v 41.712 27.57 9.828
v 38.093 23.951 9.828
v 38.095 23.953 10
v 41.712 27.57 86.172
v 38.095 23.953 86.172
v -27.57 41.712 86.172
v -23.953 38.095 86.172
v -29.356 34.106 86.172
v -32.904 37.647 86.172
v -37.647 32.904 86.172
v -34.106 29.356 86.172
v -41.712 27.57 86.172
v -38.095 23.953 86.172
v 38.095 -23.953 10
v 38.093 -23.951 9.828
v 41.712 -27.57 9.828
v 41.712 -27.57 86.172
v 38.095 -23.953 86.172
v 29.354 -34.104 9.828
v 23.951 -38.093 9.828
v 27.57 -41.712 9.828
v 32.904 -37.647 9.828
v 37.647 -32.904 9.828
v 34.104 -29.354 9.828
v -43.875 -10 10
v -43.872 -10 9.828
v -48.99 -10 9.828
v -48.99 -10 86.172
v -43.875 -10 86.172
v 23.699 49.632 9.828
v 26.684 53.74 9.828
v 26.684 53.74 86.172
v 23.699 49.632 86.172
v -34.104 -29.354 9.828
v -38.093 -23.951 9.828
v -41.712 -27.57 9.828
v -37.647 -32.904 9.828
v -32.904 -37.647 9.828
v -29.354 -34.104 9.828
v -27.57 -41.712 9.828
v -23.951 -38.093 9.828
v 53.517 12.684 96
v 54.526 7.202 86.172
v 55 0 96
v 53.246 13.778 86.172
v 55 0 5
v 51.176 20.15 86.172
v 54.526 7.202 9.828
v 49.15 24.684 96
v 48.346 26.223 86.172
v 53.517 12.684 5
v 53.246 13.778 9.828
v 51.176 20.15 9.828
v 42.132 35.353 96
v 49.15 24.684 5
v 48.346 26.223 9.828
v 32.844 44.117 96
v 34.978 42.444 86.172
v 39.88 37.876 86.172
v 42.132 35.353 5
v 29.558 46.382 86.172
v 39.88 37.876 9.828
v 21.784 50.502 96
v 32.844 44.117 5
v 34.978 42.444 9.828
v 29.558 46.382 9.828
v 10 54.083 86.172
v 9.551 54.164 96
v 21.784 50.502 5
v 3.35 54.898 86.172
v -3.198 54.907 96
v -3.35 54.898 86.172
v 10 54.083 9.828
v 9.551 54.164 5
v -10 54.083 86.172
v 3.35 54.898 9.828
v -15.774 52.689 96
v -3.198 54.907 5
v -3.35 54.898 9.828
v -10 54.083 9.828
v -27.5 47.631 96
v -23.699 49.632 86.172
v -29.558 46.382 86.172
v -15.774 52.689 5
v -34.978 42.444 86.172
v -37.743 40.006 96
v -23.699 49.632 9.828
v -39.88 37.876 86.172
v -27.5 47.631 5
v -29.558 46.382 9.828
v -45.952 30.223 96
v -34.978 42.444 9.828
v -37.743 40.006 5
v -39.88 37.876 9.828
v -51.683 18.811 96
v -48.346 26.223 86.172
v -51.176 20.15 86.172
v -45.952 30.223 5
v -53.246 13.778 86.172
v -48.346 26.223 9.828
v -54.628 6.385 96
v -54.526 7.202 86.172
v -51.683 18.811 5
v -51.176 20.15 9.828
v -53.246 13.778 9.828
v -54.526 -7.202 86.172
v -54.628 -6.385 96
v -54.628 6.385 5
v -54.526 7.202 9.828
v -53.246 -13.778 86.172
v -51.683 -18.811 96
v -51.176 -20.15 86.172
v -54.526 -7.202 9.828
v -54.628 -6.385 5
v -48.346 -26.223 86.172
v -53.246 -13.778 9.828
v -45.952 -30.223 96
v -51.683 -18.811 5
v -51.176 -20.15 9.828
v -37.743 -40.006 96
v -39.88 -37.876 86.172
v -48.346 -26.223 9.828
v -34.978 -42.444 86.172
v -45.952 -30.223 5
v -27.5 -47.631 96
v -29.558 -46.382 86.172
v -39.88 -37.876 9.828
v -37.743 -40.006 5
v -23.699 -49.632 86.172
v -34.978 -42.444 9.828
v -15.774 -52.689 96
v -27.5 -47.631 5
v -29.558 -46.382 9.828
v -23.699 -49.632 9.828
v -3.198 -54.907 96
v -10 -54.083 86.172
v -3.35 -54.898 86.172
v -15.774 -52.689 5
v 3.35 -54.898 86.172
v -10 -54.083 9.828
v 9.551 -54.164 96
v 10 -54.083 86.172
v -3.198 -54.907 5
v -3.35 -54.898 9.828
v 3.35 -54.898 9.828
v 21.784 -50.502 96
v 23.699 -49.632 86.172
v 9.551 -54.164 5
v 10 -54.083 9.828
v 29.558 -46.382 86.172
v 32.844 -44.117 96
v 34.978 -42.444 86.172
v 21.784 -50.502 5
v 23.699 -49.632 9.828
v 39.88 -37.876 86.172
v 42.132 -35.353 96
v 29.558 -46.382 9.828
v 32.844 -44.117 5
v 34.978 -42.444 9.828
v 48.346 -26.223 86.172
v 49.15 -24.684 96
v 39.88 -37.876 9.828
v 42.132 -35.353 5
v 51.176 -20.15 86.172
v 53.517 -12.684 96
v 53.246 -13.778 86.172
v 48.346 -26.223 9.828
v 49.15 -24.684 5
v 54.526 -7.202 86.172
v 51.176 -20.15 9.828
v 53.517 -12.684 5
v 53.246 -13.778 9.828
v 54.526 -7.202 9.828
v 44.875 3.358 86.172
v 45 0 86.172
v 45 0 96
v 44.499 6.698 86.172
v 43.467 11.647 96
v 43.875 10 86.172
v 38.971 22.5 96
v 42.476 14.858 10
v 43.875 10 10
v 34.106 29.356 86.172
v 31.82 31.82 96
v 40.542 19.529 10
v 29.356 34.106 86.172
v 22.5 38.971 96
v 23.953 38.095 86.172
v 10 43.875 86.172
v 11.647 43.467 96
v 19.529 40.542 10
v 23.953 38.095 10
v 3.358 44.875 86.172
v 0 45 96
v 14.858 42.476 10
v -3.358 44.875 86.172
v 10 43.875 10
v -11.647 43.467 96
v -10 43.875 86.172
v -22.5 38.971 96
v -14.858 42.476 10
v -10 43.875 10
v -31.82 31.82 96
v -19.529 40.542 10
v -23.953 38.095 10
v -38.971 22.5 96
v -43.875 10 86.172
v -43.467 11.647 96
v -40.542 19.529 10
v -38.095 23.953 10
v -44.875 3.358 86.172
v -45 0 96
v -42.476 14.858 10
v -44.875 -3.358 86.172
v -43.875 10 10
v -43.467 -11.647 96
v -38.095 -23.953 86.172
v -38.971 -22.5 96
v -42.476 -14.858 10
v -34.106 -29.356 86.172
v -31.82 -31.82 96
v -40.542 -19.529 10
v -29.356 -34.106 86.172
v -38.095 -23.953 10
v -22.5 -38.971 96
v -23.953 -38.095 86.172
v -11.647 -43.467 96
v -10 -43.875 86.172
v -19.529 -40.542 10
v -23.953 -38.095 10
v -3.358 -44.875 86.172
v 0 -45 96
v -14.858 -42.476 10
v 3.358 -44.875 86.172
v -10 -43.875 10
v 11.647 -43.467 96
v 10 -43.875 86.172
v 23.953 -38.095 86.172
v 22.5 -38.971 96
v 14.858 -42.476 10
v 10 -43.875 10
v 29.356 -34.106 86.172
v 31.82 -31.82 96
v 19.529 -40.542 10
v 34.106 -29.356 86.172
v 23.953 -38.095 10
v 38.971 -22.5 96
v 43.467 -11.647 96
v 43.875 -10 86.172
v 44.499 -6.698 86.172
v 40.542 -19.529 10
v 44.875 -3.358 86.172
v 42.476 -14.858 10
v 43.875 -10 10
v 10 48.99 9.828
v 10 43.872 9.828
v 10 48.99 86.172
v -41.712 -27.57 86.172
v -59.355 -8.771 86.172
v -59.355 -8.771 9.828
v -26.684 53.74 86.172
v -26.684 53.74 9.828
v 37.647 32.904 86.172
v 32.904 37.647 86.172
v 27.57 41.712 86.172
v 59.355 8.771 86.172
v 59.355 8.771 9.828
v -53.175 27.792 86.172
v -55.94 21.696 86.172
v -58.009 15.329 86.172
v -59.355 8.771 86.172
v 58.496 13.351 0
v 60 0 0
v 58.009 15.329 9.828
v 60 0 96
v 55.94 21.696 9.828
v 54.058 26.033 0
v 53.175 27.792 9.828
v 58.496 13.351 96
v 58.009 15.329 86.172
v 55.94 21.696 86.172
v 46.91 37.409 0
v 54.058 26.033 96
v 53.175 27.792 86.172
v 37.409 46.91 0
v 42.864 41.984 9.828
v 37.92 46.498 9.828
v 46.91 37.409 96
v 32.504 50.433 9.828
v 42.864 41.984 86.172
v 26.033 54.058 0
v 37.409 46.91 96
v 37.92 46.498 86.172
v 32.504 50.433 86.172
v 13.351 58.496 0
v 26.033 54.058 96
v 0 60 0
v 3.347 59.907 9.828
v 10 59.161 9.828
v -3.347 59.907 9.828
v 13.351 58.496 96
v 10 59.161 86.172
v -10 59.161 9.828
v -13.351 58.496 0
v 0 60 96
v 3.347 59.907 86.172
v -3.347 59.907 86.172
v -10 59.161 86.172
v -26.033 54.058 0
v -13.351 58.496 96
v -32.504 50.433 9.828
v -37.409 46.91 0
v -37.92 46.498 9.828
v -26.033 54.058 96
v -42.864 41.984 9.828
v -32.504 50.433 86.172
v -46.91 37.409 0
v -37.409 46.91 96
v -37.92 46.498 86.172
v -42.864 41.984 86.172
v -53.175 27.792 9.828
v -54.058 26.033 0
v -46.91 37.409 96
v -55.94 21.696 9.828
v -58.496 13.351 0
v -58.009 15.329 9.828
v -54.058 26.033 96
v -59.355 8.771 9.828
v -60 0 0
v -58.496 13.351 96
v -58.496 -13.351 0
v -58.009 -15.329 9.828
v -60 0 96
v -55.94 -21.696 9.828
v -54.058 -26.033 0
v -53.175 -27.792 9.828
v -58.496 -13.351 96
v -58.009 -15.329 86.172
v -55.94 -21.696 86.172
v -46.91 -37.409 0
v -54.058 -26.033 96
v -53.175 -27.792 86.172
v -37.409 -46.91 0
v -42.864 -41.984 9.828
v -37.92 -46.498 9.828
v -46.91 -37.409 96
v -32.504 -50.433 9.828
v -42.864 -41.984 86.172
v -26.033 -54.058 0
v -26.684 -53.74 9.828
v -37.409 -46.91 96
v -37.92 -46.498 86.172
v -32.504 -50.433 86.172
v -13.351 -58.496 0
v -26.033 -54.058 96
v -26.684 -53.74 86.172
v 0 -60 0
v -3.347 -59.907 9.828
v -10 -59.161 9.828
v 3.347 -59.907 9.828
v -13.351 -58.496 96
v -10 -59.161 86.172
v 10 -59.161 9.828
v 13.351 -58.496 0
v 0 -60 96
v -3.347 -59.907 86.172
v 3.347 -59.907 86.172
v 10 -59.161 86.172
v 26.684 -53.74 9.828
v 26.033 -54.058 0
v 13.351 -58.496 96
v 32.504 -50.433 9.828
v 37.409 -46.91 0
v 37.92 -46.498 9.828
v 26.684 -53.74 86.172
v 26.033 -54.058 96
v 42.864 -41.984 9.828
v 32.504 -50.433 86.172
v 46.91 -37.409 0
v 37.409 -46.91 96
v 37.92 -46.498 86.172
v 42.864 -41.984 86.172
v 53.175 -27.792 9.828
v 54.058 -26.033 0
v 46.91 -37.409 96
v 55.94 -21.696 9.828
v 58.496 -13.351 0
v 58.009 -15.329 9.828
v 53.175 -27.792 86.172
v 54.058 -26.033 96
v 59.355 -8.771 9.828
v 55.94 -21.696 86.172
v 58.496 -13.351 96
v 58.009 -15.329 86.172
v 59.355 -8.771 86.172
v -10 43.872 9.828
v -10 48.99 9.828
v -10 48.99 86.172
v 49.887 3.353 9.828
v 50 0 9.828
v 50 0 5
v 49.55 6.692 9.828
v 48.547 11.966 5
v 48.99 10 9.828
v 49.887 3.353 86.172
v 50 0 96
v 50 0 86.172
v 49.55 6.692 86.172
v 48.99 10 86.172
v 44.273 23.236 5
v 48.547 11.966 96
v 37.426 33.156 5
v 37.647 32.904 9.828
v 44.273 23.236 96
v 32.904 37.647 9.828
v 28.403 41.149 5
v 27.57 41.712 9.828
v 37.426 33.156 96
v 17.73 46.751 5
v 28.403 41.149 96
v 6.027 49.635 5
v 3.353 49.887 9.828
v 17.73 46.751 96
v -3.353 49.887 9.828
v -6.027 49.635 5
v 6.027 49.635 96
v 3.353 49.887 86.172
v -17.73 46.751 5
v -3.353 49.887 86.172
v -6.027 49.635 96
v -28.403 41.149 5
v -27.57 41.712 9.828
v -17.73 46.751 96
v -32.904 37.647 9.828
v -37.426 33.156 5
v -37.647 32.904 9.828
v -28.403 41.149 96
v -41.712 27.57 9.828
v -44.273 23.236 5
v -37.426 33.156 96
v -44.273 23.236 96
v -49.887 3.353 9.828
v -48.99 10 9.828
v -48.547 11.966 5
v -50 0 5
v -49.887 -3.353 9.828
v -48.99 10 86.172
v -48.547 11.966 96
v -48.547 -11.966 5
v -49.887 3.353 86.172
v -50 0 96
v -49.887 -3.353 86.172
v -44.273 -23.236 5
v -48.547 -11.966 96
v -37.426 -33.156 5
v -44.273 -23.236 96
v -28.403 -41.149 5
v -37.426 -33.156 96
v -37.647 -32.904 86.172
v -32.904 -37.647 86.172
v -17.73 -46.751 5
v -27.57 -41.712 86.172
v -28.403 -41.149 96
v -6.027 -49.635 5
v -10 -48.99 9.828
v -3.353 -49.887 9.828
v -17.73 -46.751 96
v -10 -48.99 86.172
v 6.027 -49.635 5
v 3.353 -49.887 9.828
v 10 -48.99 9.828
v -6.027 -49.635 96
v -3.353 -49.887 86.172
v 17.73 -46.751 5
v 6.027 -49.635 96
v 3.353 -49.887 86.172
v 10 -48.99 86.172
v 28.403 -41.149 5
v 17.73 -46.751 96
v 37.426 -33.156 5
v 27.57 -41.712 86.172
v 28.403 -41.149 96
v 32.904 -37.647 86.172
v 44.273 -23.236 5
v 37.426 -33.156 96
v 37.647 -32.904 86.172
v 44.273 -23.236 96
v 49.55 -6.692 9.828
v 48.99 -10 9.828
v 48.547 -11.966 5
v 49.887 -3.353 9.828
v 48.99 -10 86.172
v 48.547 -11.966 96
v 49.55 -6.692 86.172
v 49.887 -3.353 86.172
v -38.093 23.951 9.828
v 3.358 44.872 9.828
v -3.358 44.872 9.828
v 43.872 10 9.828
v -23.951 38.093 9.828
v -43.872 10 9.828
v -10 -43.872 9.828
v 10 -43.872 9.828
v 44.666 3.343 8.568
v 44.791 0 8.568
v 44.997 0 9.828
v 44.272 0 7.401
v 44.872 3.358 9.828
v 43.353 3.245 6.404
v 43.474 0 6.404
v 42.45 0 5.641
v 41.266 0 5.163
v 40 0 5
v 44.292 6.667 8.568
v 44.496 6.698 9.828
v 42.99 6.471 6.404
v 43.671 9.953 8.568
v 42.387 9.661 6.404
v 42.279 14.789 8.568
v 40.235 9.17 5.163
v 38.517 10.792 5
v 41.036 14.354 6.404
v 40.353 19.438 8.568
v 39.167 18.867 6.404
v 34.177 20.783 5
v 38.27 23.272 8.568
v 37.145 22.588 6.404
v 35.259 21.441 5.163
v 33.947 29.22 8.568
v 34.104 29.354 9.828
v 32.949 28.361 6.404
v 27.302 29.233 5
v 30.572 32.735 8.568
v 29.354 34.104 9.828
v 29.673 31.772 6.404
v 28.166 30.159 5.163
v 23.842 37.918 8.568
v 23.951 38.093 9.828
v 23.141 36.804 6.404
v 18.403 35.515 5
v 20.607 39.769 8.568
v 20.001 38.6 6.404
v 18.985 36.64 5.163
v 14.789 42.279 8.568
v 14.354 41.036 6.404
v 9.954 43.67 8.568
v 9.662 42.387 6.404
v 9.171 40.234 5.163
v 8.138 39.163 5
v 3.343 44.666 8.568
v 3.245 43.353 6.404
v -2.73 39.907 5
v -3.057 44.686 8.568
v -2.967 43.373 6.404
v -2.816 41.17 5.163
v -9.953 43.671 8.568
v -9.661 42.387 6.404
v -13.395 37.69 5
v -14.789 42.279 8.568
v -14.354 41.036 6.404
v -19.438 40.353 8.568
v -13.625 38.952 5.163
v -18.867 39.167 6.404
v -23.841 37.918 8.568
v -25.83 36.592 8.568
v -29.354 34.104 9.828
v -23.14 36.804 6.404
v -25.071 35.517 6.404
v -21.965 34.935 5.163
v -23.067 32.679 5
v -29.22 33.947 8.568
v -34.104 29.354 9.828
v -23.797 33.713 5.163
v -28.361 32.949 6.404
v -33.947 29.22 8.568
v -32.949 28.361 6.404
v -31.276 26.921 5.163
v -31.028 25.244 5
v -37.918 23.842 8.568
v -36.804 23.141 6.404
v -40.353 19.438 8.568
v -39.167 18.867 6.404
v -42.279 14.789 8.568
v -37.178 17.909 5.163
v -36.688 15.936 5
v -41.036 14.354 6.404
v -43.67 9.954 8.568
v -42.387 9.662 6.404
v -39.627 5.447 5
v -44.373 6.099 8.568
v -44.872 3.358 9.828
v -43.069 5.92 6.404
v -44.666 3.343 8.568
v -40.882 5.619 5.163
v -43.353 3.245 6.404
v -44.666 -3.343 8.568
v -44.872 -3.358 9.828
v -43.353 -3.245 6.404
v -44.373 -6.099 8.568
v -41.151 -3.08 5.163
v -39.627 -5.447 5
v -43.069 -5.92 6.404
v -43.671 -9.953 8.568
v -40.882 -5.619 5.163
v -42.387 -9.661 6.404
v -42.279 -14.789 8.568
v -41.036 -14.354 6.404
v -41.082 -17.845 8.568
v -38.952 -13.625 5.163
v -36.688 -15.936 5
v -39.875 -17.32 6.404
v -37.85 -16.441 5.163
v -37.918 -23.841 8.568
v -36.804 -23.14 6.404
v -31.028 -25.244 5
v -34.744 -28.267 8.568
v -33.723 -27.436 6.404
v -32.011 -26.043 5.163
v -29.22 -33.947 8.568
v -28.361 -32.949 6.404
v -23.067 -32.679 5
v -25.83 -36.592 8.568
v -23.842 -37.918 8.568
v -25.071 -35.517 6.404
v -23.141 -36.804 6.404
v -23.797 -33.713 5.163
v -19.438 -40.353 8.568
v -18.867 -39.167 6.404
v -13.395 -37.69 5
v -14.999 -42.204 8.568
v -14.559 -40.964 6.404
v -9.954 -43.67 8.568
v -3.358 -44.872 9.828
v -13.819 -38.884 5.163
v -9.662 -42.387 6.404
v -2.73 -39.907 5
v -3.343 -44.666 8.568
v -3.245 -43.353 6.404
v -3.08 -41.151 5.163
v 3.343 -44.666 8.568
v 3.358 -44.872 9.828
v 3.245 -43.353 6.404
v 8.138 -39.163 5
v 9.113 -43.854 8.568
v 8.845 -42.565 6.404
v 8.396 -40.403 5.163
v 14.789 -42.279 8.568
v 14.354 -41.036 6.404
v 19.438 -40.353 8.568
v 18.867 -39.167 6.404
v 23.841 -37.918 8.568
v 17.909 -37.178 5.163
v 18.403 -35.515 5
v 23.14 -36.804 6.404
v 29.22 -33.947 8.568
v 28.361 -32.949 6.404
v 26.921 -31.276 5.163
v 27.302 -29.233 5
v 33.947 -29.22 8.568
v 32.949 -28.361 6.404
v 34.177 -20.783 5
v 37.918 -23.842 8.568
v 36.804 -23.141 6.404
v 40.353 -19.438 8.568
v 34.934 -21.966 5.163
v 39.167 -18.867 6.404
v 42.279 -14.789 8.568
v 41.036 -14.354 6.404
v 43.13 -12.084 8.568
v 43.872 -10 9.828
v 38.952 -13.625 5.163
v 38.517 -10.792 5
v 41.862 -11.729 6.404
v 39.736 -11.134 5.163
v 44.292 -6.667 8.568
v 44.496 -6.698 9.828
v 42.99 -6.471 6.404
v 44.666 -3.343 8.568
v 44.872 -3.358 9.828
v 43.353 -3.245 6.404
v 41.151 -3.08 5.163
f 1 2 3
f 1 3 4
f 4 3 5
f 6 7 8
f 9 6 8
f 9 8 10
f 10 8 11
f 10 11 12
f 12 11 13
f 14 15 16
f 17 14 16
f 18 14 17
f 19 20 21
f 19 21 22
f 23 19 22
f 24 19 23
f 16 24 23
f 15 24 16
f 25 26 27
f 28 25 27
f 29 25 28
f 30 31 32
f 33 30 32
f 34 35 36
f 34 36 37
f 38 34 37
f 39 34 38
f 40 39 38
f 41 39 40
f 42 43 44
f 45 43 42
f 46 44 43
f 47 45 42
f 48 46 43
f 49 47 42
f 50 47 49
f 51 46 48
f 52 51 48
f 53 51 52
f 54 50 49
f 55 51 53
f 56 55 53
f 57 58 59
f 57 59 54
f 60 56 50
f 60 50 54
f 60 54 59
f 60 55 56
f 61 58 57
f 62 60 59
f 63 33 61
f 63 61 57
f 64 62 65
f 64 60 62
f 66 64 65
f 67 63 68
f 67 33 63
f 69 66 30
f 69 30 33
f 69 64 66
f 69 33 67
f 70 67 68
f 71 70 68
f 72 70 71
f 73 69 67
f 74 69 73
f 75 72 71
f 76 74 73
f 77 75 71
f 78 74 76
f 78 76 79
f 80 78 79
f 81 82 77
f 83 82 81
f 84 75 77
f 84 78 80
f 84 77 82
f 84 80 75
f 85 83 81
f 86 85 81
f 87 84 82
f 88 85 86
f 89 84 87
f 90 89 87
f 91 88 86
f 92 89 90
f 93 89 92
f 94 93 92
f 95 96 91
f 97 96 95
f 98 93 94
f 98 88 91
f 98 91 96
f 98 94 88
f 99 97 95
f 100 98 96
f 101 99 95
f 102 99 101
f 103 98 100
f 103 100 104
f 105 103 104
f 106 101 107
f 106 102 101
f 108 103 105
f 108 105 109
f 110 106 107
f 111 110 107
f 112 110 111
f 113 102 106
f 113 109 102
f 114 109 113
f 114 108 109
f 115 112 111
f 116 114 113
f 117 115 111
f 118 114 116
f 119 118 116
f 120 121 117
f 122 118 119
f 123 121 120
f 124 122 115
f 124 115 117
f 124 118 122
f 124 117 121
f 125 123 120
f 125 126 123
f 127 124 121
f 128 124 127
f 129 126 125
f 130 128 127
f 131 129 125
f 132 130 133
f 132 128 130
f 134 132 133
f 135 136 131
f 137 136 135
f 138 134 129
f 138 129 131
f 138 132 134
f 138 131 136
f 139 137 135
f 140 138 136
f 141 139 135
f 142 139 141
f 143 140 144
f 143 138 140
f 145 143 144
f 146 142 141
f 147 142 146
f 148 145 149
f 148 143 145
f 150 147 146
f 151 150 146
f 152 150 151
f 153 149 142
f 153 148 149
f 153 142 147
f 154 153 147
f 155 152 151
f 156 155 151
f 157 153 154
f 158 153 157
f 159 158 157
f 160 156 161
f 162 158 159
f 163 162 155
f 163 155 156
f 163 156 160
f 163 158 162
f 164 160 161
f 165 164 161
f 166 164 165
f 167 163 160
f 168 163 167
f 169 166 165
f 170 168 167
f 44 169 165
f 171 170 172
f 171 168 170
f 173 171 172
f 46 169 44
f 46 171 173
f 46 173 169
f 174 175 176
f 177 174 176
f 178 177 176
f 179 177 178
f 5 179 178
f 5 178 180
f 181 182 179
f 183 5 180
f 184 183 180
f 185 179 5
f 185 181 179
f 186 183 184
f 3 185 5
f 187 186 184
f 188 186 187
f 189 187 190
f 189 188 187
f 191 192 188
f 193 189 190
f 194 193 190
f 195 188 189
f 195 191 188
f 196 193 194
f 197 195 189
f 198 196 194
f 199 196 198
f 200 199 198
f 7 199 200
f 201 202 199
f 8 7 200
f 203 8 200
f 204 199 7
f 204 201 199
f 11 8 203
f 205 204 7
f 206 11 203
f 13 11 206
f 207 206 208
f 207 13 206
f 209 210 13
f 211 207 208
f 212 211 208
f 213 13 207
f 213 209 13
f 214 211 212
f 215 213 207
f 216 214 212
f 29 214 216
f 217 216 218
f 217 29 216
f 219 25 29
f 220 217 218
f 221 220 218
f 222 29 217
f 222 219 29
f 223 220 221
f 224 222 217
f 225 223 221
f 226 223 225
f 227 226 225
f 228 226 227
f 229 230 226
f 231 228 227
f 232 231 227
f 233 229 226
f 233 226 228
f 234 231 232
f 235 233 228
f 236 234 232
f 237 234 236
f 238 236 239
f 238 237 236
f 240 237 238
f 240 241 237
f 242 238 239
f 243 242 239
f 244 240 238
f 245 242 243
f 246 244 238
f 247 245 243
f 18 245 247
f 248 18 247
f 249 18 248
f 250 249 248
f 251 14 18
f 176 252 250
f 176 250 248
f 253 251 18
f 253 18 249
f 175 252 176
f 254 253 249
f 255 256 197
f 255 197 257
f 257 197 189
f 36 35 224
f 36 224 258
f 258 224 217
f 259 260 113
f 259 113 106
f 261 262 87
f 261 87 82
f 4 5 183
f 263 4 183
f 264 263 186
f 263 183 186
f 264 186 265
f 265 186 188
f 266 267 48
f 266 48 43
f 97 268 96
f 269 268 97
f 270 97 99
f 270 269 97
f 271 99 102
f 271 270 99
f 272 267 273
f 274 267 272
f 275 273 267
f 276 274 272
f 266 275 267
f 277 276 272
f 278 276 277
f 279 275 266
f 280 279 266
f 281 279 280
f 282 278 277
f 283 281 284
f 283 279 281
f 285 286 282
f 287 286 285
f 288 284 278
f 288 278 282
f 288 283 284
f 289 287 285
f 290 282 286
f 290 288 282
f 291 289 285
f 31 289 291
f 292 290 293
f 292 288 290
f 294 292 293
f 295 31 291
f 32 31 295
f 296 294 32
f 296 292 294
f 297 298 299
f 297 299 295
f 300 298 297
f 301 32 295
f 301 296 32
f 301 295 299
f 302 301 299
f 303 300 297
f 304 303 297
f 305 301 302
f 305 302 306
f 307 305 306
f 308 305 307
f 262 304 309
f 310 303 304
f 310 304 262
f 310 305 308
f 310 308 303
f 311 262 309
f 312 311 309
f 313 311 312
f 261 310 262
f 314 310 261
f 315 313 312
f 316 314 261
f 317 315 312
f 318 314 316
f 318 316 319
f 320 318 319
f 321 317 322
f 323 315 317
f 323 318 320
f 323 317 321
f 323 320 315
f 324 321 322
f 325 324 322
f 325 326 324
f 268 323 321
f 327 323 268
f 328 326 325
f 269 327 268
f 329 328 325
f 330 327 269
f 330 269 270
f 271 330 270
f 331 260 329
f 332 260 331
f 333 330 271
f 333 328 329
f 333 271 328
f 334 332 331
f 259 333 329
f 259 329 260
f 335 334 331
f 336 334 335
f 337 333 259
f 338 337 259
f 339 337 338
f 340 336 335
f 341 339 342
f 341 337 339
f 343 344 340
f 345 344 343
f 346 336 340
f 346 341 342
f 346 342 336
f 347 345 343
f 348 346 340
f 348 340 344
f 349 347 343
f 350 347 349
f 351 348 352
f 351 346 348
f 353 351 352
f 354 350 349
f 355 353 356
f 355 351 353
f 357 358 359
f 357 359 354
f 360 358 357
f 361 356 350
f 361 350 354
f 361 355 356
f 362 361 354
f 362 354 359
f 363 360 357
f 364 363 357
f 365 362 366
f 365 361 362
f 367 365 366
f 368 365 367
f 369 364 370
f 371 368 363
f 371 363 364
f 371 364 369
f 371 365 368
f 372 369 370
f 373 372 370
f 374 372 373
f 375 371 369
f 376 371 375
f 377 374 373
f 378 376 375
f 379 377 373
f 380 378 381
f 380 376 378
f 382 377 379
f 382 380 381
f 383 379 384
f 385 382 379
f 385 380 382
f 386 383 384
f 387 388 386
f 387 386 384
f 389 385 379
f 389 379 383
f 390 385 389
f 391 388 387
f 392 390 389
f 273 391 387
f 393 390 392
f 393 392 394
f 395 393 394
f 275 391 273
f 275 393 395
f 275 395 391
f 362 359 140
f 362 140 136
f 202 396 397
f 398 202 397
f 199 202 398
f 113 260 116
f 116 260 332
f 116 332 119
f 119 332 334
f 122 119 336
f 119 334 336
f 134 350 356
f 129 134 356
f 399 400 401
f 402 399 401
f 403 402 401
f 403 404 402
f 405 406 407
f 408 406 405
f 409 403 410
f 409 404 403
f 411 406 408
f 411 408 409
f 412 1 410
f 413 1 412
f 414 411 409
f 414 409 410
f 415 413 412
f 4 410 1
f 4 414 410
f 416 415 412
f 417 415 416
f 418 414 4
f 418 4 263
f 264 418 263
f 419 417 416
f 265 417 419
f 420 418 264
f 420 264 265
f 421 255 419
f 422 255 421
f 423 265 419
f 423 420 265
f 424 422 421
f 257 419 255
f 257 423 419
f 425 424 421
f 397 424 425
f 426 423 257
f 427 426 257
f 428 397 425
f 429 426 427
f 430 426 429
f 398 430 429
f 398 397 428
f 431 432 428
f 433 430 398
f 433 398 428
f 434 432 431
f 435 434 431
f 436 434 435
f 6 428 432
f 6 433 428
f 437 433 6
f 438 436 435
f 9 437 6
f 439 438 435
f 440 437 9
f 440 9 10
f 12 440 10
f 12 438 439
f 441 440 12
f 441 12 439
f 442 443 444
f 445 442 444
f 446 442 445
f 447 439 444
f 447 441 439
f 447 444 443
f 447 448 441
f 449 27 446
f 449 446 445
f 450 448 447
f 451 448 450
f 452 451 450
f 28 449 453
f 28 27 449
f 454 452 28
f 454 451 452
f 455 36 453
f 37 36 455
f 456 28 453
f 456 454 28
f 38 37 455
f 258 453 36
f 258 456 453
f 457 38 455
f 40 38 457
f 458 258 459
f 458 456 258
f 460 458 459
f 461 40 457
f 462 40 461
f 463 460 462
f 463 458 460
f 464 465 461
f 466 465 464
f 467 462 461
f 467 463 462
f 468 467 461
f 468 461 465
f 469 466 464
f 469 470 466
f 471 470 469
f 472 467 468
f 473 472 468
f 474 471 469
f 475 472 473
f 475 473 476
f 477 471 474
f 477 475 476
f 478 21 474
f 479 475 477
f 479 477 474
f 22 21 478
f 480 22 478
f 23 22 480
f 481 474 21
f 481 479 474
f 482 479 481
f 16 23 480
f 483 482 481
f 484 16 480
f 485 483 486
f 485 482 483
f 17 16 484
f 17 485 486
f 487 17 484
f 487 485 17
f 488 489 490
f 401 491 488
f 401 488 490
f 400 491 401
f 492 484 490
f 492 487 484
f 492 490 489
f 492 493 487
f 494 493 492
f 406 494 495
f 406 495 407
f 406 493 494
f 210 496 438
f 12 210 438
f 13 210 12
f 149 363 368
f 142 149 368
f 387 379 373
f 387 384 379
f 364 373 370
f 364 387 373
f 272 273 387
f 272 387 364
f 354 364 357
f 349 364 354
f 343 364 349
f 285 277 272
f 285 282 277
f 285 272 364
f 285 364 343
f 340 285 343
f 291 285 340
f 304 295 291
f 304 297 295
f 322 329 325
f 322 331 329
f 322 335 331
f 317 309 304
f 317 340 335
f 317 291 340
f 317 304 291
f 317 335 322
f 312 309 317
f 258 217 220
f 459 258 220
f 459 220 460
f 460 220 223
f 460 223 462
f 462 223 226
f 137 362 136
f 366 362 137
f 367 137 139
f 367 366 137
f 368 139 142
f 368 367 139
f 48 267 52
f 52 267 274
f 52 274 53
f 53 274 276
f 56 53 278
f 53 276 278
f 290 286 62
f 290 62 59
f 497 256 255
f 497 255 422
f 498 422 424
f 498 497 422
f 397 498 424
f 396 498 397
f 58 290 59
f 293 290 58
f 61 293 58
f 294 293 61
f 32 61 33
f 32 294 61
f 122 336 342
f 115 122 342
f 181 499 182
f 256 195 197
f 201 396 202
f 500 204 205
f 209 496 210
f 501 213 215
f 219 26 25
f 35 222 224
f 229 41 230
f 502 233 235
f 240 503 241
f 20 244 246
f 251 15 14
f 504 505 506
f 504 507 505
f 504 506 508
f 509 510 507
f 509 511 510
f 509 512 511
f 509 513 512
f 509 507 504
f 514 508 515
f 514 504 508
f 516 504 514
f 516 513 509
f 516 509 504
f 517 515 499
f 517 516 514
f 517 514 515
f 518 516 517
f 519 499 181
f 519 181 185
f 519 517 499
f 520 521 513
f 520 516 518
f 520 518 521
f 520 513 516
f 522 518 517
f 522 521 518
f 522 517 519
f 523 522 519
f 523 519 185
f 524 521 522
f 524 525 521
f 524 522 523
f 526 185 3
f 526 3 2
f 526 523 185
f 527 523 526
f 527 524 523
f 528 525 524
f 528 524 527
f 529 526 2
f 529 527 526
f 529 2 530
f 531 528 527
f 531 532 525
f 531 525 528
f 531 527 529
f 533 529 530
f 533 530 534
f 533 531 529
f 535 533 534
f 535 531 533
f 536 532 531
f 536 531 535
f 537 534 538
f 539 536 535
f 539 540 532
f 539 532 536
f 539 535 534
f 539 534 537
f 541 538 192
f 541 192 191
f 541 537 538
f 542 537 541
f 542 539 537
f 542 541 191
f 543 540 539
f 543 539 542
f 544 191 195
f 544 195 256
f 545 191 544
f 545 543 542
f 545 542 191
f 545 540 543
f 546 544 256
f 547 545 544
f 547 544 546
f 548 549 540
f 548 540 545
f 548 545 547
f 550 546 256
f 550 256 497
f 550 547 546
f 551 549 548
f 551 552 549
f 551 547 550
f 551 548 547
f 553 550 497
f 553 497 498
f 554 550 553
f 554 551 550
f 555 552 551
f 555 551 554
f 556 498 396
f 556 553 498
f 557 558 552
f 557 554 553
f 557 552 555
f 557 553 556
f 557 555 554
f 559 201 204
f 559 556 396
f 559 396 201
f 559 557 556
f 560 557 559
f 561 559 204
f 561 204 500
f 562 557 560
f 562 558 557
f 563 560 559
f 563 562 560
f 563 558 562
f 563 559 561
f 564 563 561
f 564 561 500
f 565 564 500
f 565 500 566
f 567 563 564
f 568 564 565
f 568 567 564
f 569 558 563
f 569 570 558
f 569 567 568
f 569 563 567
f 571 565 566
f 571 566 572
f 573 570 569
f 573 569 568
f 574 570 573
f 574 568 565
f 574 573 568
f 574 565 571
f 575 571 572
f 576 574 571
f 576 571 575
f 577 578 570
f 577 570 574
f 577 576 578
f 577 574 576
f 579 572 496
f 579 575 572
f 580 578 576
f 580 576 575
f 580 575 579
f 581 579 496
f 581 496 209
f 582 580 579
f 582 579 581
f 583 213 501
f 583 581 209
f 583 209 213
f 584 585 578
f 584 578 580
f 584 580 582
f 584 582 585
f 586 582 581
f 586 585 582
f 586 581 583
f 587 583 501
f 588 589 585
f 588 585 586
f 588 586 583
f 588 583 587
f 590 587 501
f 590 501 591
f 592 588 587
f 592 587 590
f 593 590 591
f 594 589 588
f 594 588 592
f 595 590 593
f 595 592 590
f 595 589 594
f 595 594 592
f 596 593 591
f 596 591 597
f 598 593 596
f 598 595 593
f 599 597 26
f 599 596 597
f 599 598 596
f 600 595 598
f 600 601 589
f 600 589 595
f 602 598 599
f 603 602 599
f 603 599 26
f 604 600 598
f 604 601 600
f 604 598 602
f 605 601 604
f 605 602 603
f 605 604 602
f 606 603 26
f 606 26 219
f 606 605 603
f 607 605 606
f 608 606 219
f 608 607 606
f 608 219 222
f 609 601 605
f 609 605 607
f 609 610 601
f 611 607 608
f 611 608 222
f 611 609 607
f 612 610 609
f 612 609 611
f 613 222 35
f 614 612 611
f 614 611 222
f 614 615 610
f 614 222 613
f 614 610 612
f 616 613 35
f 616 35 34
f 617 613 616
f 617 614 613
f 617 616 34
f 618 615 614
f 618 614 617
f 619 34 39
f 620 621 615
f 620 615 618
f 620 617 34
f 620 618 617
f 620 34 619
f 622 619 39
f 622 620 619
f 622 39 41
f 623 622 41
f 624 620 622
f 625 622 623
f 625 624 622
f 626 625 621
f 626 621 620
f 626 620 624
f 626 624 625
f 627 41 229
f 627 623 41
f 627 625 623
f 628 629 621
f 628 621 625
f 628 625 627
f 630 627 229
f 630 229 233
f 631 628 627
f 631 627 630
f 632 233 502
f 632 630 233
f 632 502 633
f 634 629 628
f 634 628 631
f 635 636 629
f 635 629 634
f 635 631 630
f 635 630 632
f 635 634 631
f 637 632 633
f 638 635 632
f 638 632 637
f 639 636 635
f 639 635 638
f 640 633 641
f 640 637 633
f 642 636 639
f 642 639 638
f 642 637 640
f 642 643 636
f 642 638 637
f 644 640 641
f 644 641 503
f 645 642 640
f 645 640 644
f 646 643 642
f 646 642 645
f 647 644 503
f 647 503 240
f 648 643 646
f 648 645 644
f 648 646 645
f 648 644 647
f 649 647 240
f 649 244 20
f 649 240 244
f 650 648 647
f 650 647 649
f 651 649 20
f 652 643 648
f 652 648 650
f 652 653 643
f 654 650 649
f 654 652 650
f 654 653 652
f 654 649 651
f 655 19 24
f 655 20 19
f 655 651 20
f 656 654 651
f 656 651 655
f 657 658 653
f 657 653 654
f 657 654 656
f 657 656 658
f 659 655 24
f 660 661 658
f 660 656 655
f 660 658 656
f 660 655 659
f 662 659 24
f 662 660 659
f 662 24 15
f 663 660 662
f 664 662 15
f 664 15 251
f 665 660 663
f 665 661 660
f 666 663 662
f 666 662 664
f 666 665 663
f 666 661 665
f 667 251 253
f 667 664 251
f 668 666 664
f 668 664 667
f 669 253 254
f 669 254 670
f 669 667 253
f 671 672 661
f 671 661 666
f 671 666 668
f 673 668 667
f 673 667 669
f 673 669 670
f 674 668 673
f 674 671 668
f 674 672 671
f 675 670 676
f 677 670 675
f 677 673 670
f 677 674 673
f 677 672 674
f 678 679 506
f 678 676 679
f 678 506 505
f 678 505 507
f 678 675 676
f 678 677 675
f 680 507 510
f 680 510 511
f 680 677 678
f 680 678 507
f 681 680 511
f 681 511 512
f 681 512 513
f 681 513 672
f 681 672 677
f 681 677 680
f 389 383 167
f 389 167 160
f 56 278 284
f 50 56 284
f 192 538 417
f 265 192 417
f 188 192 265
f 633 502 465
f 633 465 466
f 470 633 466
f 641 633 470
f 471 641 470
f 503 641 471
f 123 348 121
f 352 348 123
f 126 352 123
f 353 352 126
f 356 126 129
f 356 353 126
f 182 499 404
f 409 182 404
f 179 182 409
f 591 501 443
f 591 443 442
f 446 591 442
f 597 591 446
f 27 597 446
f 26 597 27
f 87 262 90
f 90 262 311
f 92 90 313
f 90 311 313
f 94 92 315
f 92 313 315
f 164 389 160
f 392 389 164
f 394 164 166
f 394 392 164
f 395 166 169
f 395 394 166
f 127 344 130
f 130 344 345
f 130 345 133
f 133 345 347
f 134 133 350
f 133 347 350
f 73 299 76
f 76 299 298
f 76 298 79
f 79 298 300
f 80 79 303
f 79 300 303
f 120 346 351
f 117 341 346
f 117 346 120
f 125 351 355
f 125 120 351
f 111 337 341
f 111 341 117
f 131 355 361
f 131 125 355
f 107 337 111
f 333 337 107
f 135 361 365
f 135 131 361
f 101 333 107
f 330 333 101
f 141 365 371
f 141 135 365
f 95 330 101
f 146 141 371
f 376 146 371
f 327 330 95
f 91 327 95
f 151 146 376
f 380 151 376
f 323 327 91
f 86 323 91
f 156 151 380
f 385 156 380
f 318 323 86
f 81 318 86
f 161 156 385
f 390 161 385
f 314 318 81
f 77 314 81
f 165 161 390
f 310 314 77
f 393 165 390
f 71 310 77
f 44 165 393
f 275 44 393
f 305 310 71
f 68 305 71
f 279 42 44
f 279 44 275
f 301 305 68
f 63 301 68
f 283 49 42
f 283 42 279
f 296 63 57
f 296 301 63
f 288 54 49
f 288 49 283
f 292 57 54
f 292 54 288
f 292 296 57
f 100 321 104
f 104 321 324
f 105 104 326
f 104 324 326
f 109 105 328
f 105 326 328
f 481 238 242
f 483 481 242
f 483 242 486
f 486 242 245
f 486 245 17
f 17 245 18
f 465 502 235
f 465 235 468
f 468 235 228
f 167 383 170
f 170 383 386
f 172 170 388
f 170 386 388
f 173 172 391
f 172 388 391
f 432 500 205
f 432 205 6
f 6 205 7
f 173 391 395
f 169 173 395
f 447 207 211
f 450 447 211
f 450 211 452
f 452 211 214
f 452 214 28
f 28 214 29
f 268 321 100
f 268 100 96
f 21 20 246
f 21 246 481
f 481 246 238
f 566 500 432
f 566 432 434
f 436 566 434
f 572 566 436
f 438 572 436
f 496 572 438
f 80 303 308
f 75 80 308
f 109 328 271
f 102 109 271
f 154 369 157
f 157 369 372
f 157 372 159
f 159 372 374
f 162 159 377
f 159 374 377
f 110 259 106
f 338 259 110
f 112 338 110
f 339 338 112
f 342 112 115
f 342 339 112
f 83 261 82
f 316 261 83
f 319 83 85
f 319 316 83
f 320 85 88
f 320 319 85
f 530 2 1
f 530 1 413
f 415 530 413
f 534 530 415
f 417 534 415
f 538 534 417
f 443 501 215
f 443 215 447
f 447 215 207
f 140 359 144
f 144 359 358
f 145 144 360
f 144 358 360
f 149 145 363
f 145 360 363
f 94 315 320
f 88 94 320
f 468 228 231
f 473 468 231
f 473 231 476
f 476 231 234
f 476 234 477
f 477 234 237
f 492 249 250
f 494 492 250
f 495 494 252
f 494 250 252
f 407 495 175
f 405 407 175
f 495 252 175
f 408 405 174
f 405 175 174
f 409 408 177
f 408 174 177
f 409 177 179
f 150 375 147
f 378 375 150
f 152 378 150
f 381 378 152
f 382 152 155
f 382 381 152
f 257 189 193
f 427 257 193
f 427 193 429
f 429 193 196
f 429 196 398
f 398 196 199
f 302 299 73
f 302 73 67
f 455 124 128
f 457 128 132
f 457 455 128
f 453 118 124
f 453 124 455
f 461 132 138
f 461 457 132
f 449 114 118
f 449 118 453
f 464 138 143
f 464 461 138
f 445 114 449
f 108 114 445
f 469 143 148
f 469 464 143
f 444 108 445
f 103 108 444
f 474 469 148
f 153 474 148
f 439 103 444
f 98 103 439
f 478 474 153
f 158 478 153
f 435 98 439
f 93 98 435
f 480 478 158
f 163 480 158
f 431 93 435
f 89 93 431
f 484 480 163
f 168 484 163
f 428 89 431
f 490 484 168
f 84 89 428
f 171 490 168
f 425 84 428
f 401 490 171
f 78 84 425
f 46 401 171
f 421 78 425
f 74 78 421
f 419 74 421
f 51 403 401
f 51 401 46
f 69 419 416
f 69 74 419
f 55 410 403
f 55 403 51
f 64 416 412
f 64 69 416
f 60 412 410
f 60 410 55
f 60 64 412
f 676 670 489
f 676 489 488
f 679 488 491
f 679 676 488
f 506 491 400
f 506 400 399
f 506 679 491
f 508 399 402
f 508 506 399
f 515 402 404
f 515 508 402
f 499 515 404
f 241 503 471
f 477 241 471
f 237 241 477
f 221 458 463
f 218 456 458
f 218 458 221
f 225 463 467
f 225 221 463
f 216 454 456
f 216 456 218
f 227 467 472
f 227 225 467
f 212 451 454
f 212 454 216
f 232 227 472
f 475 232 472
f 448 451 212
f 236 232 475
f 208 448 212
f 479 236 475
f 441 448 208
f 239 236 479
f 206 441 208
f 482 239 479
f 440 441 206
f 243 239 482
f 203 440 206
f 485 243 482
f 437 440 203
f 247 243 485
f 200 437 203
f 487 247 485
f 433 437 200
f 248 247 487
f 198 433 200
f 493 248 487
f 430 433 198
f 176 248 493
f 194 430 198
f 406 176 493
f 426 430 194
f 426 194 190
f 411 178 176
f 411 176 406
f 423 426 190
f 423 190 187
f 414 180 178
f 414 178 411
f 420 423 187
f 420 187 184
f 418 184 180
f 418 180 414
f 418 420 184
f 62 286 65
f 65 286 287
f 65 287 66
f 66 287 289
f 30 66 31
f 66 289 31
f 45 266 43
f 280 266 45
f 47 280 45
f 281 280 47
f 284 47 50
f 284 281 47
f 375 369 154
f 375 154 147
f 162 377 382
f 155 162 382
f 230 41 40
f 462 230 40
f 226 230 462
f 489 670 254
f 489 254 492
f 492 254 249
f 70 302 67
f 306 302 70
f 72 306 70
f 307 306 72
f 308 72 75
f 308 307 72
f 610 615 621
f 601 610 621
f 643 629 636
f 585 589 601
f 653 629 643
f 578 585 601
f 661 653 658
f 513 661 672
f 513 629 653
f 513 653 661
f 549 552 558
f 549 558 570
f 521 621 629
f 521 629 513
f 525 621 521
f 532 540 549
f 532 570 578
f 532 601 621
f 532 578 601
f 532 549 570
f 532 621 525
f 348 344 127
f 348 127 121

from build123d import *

# Parameters (mm, degrees)
F2_W            = 20
F2_H            = 76.3443418741
F3_REACH        = 138.9215837294
F3_COPIES_COUNT = 8
F5_W            = 20
F5_H            = 76.3443418741
F6_REACH        = 213.9215837294
F6_COPIES_COUNT = 10


# Not quite as in the source:
# - a pattern or mirror of a feature is missing from the dataset's text; its kind, count and spacing are read off the source's solid


with BuildPart() as f1:
    # F0 (on Front) → F1 (revolve)
    with BuildSketch(Plane.XZ):
        with BuildLine():
            Line((0, 5), (0, 0))
            Line((0, 0), (60, 0))
            Line((60, 0), (60, 96))
            Line((60, 96), (55, 96))
            Line((55, 96), (55, 5))
            Line((55, 5), (50, 5))
            Line((50, 5), (50, 96))
            Line((50, 96), (45, 96))
            Line((45, 96), (45, 10))
            ThreePointArc((45, 10), (43.5355339059, 6.4644660941), (40, 5))
            Line((40, 5), (0, 5))
        make_face()
    revolve(axis=Axis((0, 0, 2.5), (0, 0, 1)))

    f3_end = f1.faces().sort_by_distance((-50, 0, 50.5))[0]
    # F2 (on Front) → F3 (cut, up to a face of the model that its end follows)
    with BuildSketch(Plane.XZ):
        with Locations((0, 48)):
            Rectangle(F2_W, F2_H)
    f3_long = extrude(amount=F3_REACH, mode=Mode.PRIVATE)
    f3 = split(f3_long, bisect_by=f3_end, keep=Keep.BOTTOM, mode=Mode.PRIVATE)
    add(f3, mode=Mode.SUBTRACT)

    # F3_copies: F3 ×8 about axis
    f3_copies_axis = Axis((0, 0, 0), (0, 0, 1))
    for i in range(1, F3_COPIES_COUNT):
        add(f3.rotate(f3_copies_axis, i * 360 / F3_COPIES_COUNT), mode=Mode.SUBTRACT)

    f6_end = f1.faces().sort_by_distance((-55, 0, 50.5))[0]
    # F5 (on offset) → F6 (cut, up to a face of the model that its end follows)
    with BuildSketch(Plane.XZ.offset(75)):
        with Locations((0, 48)):
            Rectangle(F5_W, F5_H)
    f6_long = extrude(amount=-F6_REACH, mode=Mode.PRIVATE)
    f6 = split(f6_long, bisect_by=f6_end, keep=Keep.ALL, mode=Mode.PRIVATE).solids().sort_by_distance((0, -75, 48))[0]
    add(f6, mode=Mode.SUBTRACT)

    # F6_copies: F6 ×10 about axis
    f6_copies_axis = Axis((0, 0, 0), (0, 0, 1))
    for i in range(1, F6_COPIES_COUNT):
        add(f6.rotate(f6_copies_axis, i * 360 / F6_COPIES_COUNT), mode=Mode.SUBTRACT)


solid = f1.part
